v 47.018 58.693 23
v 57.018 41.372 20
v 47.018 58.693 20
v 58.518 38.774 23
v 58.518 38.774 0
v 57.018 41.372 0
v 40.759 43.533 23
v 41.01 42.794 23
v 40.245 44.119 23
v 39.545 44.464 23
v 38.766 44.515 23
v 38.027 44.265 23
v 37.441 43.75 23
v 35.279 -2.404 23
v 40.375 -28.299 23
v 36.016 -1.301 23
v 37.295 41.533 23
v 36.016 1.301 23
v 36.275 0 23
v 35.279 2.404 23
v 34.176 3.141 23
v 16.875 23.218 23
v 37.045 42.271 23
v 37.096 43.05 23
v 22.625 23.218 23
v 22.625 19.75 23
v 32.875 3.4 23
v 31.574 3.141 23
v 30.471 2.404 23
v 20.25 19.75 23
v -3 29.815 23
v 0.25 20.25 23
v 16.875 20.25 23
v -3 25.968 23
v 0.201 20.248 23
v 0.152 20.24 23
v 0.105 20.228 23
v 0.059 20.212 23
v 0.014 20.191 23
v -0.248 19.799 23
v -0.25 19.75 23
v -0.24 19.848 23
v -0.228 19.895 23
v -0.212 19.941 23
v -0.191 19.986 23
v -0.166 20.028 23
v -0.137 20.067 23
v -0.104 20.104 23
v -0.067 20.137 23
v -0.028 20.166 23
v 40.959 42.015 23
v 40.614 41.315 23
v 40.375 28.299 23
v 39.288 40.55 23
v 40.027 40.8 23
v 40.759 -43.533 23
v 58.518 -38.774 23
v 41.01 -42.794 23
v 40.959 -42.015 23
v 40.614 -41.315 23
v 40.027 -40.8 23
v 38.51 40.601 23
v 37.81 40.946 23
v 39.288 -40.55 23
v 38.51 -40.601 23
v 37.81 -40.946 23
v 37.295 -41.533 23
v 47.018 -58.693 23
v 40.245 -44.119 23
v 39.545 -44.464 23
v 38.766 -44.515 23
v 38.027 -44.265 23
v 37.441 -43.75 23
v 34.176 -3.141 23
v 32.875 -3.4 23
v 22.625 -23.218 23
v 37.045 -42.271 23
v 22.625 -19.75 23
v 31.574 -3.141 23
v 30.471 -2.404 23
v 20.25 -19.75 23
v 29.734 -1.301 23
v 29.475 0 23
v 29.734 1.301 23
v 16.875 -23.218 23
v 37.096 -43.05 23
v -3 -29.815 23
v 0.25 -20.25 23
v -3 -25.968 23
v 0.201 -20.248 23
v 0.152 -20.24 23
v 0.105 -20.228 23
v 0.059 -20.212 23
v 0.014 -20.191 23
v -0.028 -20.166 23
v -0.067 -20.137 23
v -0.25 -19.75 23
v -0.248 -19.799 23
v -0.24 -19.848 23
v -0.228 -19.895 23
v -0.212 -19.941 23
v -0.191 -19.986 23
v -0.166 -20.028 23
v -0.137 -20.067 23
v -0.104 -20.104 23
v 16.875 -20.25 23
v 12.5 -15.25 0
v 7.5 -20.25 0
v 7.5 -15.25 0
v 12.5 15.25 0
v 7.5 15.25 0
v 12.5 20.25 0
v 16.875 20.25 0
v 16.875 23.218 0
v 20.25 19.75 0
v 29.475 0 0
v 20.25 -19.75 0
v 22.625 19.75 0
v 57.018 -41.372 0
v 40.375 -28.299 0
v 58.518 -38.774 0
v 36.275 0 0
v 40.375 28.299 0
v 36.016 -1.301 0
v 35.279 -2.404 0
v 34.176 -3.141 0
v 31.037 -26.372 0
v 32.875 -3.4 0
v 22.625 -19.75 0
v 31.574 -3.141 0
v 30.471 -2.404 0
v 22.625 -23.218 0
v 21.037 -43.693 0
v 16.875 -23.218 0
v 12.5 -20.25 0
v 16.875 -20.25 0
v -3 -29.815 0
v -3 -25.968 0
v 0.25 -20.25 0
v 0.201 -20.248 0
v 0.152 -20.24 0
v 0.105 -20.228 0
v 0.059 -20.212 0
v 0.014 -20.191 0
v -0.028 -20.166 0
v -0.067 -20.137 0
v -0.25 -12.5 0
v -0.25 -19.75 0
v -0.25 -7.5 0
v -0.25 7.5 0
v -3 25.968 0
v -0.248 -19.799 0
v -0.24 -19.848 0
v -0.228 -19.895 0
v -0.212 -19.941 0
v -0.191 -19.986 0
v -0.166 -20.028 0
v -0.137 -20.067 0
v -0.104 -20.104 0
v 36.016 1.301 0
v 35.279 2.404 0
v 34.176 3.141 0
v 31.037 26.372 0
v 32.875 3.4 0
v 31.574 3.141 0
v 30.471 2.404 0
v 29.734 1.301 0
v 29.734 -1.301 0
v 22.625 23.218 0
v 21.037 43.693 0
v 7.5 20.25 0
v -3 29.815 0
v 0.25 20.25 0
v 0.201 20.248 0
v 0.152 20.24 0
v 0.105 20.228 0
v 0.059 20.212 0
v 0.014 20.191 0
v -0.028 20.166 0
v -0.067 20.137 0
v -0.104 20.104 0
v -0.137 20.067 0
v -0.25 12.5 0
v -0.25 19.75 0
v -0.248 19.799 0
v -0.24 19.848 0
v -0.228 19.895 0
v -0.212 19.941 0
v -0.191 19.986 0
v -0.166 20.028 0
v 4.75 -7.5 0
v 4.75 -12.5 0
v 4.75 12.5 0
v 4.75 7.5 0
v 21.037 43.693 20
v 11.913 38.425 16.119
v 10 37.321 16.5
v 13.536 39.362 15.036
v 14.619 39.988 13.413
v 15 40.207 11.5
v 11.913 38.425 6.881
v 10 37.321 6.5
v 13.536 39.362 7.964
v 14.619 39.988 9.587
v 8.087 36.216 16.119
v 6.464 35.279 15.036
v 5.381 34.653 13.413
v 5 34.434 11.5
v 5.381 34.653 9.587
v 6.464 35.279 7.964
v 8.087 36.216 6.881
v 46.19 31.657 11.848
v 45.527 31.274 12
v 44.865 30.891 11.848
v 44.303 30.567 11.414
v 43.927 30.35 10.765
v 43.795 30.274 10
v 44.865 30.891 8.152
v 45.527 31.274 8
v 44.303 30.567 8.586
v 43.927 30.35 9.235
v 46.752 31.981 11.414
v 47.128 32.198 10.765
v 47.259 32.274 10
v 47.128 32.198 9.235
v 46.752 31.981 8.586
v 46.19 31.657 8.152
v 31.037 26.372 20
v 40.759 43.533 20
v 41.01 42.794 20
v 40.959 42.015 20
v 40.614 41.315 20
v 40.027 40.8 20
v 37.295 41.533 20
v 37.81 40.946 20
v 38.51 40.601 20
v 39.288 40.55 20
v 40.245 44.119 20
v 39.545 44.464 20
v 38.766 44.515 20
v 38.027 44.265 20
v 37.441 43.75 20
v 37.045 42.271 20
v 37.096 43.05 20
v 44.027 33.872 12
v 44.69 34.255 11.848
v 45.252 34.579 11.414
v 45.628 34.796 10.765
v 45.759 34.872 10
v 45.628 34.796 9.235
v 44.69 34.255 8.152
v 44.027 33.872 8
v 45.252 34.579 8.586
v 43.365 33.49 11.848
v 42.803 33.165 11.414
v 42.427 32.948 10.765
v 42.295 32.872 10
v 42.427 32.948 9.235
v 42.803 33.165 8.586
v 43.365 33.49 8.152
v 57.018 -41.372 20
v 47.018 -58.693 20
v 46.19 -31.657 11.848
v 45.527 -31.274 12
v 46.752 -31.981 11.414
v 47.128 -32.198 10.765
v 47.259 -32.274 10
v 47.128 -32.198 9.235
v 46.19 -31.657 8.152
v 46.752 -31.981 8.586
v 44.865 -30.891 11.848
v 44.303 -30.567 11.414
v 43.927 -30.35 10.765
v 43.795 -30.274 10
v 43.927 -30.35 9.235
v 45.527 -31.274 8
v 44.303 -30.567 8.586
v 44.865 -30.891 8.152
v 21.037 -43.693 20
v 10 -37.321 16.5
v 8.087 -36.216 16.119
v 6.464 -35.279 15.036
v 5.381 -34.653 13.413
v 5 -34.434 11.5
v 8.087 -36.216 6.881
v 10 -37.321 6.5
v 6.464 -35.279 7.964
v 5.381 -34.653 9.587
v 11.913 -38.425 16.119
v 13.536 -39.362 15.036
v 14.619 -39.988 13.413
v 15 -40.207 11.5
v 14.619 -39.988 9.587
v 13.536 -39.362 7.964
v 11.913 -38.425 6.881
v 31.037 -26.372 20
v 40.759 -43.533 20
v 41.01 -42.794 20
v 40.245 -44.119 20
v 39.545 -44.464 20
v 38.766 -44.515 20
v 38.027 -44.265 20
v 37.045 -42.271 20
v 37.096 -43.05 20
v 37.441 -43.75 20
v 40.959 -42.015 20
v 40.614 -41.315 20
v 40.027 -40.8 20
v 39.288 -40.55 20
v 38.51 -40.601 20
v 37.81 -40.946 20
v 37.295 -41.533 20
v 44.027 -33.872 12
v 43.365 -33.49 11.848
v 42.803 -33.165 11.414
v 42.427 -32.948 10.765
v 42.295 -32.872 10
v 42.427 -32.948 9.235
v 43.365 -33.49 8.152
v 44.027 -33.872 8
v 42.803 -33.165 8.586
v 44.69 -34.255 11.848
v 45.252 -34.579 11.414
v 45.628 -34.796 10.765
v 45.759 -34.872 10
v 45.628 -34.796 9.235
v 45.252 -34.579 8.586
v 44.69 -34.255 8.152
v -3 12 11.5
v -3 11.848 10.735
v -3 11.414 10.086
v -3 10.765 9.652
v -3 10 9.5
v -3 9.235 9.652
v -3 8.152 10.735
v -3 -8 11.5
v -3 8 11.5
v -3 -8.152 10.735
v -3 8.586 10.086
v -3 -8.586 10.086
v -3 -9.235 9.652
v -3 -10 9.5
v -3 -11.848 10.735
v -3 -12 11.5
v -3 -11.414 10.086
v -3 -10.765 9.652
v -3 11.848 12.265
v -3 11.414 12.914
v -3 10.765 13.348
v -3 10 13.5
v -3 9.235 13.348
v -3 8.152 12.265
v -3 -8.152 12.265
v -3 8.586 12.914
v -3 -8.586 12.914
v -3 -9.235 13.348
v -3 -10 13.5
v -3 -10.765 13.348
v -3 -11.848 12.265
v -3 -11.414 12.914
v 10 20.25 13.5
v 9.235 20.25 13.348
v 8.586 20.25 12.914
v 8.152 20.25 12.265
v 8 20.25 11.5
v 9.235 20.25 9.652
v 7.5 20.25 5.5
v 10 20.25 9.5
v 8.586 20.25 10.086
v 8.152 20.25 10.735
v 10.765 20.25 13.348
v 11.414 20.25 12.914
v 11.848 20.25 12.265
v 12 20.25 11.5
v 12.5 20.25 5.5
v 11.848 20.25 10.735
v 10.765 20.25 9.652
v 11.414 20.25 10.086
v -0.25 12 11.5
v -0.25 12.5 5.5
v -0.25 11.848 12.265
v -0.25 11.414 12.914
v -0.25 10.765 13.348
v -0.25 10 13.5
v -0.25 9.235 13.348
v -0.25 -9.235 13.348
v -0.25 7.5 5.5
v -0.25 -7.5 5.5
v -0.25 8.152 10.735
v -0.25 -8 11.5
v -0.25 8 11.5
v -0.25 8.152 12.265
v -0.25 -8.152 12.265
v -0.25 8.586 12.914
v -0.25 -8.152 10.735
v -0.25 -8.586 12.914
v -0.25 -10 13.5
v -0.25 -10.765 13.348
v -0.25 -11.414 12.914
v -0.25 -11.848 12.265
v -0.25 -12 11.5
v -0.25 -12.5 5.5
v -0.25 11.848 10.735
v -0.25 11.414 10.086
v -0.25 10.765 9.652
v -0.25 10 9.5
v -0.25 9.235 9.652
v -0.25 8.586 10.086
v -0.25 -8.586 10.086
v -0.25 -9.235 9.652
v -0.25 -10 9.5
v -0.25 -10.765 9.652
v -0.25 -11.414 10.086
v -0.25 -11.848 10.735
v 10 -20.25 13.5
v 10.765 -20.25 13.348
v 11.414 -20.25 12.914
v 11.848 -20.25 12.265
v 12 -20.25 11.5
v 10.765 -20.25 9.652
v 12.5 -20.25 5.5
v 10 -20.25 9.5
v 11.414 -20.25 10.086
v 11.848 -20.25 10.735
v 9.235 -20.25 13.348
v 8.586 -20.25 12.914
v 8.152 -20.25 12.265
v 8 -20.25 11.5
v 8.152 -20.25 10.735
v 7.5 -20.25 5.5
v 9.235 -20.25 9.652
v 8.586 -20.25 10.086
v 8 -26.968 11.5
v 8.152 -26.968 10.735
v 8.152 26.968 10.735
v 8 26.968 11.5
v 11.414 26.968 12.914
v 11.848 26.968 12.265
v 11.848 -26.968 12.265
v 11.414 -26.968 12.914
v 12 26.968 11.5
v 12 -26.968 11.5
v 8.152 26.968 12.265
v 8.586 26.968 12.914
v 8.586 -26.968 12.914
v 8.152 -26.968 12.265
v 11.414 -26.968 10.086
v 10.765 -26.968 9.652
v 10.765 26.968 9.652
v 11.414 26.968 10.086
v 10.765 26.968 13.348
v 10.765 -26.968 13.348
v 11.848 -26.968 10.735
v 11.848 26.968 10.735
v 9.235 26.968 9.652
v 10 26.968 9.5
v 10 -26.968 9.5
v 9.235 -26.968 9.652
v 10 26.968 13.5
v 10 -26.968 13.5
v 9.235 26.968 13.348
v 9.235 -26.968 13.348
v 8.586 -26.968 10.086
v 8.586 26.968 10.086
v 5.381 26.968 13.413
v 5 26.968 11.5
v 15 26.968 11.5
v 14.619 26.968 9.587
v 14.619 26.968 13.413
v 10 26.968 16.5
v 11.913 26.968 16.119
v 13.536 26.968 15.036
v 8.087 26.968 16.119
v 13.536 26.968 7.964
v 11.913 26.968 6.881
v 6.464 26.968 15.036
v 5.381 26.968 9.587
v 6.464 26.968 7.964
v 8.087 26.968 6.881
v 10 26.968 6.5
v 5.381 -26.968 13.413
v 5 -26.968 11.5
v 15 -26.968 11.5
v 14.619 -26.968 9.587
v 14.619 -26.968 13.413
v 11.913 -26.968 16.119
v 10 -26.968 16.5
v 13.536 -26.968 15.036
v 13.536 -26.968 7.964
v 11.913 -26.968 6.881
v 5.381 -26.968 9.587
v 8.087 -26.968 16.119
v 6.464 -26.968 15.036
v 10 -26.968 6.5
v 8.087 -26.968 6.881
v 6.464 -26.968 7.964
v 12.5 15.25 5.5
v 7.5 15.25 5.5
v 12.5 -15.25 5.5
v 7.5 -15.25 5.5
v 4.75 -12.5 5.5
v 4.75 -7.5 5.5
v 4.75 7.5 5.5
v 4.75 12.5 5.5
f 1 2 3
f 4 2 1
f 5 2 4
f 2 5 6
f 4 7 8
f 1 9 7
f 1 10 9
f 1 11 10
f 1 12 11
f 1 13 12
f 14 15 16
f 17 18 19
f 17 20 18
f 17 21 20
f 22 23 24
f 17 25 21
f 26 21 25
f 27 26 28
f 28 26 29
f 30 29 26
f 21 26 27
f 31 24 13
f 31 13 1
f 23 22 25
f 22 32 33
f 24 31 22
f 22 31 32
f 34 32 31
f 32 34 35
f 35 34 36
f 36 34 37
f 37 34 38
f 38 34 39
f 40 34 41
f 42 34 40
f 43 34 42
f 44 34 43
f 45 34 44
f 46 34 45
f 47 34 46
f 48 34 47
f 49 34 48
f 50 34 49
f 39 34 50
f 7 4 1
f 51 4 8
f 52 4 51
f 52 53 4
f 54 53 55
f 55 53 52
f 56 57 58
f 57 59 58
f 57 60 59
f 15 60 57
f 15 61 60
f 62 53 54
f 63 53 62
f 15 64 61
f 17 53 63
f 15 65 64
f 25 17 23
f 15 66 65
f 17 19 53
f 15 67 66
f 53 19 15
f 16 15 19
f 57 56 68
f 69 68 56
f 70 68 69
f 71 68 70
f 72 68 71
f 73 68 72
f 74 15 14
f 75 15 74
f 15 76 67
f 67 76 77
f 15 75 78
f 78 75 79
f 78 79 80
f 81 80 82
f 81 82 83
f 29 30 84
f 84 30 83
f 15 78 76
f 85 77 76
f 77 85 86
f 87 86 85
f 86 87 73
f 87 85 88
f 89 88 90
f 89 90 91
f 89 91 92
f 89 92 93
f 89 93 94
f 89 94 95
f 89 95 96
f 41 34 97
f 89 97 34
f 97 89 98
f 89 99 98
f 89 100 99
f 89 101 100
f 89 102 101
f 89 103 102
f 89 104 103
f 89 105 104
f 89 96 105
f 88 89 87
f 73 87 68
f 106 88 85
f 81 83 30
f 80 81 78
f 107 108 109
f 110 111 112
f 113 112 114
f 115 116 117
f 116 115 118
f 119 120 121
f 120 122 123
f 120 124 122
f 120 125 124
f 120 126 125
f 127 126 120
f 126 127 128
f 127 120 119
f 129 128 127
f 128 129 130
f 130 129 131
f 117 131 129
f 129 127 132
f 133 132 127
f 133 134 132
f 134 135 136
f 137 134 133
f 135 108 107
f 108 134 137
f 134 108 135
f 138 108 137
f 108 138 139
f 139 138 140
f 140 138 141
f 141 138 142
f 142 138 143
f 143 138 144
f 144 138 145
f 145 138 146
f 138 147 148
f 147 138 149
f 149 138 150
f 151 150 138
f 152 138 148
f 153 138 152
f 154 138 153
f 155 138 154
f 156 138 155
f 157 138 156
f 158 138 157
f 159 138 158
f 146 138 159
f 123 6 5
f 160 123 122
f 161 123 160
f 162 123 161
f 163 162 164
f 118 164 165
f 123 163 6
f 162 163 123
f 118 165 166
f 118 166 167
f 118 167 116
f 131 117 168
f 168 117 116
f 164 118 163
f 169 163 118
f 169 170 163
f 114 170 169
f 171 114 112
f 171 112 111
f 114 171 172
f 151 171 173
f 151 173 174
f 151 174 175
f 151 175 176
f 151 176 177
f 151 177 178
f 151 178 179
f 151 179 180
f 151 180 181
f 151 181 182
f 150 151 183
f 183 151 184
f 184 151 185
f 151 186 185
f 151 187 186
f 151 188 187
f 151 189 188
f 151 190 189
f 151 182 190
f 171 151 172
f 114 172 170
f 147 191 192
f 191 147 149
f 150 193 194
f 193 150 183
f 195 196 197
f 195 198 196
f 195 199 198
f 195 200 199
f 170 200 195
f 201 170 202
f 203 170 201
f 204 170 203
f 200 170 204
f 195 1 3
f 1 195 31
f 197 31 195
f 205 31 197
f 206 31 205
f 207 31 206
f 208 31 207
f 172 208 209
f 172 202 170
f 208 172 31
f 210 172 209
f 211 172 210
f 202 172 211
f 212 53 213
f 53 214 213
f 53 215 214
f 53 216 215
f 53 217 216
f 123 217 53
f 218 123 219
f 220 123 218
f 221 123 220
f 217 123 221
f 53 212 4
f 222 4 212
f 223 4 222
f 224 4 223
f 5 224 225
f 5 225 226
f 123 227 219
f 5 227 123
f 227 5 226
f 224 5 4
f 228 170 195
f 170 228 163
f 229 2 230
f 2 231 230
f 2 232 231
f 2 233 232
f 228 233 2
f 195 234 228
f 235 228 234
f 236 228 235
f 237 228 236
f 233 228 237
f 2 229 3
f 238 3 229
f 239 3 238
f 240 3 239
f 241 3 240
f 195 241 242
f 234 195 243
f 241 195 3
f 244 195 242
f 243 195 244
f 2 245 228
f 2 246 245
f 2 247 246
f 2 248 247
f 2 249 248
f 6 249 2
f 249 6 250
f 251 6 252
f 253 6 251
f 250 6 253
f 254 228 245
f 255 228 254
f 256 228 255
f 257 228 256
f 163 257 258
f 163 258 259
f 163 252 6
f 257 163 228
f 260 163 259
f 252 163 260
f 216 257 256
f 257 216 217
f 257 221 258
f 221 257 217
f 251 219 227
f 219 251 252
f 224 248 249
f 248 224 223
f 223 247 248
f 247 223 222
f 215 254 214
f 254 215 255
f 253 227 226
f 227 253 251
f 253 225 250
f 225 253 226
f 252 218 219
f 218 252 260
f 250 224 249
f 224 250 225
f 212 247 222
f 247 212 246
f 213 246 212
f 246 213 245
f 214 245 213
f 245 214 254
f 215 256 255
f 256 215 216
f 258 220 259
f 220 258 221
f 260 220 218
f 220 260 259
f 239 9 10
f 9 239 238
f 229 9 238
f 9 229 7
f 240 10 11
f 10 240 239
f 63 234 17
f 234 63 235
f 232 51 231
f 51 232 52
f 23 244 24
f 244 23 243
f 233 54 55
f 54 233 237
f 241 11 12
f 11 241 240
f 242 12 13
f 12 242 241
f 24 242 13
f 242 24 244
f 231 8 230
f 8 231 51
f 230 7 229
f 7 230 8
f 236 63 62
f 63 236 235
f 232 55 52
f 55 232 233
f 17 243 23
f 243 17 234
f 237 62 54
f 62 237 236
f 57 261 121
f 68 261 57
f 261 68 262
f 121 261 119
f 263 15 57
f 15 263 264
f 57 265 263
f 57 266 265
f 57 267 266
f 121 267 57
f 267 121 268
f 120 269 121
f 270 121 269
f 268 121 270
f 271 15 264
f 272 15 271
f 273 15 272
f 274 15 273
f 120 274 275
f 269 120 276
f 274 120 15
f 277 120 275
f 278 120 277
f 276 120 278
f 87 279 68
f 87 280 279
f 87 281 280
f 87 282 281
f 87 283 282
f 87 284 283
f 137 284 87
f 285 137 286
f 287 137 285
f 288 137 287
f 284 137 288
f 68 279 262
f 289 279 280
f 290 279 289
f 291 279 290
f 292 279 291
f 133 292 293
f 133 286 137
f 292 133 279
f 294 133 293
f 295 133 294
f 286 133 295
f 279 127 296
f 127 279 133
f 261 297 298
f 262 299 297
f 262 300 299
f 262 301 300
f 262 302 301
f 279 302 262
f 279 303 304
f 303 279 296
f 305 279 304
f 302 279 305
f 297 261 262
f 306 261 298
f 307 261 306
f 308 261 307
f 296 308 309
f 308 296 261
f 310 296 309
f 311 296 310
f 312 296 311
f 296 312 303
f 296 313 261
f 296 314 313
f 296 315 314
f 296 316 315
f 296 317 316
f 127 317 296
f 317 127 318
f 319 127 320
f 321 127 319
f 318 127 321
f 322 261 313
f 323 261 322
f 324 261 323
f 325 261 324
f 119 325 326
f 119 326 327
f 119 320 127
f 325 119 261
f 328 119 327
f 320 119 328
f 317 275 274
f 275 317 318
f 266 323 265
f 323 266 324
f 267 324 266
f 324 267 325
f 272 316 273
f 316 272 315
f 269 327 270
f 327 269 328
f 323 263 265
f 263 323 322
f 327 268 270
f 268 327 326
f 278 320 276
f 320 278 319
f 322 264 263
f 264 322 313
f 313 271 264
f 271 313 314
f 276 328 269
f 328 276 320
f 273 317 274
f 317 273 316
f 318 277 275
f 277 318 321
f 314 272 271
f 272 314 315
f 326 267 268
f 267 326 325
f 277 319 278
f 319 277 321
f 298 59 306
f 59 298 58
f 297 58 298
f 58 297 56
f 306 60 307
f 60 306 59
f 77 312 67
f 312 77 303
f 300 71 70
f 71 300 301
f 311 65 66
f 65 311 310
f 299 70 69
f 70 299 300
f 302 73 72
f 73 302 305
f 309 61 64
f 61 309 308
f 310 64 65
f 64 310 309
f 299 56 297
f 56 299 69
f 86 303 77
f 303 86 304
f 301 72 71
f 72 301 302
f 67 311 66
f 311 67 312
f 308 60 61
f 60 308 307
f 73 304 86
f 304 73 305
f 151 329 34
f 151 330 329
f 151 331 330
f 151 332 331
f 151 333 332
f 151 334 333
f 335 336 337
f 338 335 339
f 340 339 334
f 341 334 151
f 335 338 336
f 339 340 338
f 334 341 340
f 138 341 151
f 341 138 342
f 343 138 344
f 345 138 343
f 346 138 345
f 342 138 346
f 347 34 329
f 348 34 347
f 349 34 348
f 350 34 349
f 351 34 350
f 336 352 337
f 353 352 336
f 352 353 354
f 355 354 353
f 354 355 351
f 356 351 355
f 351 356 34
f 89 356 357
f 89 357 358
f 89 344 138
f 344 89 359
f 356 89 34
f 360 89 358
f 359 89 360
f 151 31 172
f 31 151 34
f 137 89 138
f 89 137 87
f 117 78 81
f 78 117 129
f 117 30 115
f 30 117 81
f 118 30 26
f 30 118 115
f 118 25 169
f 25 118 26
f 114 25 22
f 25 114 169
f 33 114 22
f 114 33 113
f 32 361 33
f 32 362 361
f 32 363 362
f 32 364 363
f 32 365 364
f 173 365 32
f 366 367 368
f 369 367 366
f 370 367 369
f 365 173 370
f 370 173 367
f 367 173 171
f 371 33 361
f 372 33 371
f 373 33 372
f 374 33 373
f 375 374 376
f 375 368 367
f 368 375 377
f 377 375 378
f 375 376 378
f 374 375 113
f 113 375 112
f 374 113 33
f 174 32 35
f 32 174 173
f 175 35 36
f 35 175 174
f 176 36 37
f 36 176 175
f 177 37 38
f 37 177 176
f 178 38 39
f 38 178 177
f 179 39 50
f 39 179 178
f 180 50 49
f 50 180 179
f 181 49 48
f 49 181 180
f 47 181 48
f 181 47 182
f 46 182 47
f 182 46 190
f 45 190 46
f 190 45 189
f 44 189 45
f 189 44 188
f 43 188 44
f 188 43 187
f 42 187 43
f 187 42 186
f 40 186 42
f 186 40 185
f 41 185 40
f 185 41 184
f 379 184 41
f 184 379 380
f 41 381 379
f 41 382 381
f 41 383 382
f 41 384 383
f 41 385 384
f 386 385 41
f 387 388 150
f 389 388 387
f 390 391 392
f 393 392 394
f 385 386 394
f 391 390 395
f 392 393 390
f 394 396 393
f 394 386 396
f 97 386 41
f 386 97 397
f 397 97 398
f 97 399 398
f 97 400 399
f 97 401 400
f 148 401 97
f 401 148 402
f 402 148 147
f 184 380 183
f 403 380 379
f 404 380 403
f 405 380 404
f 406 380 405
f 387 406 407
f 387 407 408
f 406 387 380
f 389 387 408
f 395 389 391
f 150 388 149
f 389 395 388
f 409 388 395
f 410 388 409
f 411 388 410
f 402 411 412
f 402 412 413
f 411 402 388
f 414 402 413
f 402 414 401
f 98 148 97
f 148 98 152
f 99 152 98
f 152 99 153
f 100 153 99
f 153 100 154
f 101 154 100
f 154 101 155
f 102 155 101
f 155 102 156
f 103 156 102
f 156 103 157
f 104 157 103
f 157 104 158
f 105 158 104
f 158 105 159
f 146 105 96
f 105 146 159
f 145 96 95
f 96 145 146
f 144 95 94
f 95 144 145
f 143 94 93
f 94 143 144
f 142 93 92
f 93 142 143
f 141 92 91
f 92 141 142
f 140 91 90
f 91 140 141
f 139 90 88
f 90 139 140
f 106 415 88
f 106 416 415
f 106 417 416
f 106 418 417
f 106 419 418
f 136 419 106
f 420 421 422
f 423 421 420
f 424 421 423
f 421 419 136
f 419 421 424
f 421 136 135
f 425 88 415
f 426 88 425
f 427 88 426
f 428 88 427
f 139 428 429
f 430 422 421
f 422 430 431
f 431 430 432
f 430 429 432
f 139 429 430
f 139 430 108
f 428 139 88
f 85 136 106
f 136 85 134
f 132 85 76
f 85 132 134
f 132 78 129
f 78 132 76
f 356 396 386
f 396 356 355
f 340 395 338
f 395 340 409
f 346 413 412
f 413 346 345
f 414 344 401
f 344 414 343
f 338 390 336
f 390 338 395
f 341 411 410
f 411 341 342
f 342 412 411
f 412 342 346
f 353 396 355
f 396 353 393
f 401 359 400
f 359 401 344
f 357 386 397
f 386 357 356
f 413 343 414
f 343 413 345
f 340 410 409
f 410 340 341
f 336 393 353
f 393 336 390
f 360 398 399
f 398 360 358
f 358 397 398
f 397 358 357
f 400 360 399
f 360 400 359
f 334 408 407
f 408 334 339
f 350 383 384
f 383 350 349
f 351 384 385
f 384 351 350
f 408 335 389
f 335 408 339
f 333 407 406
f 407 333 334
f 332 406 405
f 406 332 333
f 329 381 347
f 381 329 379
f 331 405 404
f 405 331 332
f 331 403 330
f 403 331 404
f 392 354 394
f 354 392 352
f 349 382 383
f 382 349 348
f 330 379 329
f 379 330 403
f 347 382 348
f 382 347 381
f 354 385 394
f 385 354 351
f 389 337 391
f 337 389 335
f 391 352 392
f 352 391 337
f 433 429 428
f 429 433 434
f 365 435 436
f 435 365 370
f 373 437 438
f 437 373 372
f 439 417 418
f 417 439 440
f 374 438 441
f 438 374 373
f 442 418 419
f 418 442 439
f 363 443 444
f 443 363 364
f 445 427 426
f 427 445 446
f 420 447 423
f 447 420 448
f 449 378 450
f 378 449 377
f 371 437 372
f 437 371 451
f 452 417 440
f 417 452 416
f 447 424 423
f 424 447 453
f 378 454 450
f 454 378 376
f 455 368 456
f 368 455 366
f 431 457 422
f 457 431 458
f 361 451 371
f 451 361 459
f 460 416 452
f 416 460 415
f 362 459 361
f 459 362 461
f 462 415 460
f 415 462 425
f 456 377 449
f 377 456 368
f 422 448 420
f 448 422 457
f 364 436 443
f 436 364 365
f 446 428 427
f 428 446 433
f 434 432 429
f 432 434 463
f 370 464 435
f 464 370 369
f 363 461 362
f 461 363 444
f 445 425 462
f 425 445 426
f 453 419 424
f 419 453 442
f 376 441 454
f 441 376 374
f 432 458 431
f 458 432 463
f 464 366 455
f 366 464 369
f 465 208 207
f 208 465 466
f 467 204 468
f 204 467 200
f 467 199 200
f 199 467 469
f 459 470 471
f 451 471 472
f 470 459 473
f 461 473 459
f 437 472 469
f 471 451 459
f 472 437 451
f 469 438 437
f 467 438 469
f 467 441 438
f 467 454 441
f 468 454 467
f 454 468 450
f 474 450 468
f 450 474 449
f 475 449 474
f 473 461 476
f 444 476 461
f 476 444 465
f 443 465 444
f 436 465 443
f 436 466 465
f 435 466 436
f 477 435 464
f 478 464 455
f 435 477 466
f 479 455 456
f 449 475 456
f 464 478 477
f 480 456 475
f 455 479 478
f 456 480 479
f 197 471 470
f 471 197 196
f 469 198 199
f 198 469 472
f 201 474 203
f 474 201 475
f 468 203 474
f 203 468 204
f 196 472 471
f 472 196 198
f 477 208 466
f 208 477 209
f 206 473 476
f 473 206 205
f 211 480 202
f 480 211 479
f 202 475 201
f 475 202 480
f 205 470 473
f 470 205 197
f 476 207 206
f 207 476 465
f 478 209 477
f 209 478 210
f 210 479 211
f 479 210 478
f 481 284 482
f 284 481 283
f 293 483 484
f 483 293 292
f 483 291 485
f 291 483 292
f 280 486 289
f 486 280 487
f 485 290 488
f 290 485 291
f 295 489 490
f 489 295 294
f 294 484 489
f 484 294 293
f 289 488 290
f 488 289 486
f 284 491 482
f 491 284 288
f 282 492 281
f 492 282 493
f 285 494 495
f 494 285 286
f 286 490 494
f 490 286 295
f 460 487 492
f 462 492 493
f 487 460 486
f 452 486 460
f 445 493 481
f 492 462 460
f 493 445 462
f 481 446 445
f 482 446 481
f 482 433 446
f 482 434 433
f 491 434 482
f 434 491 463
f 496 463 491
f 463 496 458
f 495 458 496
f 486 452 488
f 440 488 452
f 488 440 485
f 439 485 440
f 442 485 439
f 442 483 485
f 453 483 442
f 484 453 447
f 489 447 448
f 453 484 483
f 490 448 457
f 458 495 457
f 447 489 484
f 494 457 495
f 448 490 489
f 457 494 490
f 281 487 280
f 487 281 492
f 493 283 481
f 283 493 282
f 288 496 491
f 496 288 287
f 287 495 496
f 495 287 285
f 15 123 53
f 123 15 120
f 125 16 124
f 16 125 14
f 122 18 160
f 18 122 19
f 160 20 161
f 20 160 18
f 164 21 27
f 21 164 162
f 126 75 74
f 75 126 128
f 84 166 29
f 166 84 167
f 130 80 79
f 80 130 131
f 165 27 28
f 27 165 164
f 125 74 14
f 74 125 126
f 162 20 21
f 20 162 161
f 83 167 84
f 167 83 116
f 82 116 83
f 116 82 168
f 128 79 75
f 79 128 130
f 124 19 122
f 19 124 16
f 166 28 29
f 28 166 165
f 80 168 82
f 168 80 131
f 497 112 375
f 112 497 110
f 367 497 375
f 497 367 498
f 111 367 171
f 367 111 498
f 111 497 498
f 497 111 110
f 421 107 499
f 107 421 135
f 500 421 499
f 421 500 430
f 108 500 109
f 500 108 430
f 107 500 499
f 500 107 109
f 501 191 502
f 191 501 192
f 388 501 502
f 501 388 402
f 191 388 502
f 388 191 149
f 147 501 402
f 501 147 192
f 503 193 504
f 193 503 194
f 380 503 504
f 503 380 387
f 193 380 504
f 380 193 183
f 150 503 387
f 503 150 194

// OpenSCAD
/**********************************************************************************************************************
 **
 ** parts/printed/foot_rail.scad
 **
 ** This file constructs the version of the foot of the printer frame that holds a horizontal rail. To assemble the 
 ** printer, you need three of these parts.
 **
 **********************************************************************************************************************/

include <../../conf/colors.scad>
include <../../conf/derived_sizes.scad>
include <../../conf/part_sizes.scad>

use <../../bom/bom.scad>
use <../../parts/extrusions/makerslide.scad>
use <../../parts/extrusions/vslot_2020.scad>
use <../../parts/vitamins/vitamins.scad>

// The dimensions of the horizontal parts that hold the V-Slot extrusions.
function _foot_rail_horizontal_height() = vslot_2020_depth() + frame_wall_thickness();
function _foot_rail_horizontal_width()  = vslot_2020_width() + frame_wall_thickness();
function _foot_rail_horizontal_depth()  = horizontal_extrusion_offset() + horizontal_recess_depth();
function _foot_rail_horizontal_left_y_offset() = -frame_wall_thickness() + horizontal_extrusion_outward_offset();
function _foot_rail_horizontal_right_y_offset() = -_foot_rail_horizontal_width() - horizontal_extrusion_outward_offset() + frame_wall_thickness();

// The dimensions of the vertical part that holds the MakerSlide extrusion.
function _foot_rail_vertical_height() = foot_rail_makerslide_recess_depth();
function _foot_rail_vertical_width()  = frame_wall_thickness() + makerslide_width() + frame_wall_thickness();
function _foot_rail_vertical_depth()  = frame_wall_thickness() + makerslide_depth() + frame_wall_thickness();
function _foot_rail_vertical_side_screw_height() = _foot_rail_horizontal_height()/2; // align with other screw
function _foot_rail_vertical_side_screw_y_offset() = _foot_rail_vertical_width()/2 + 1;

function _foot_rail_t_slot_nut_holder_height() = (foot_rail_makerslide_recess_depth() - t_slot_nut_length()) / 2 
                                                 - t_slot_nut_clearance();

/**
 * Auxiliary module that creates one of the vertical legs. Not to be used outside of this file.
 */
module _foot_rail_horizontal_leg(right = false) { 
	difference() {
		// the basic shape of the leg
		cube([_foot_rail_horizontal_depth(), _foot_rail_horizontal_width(), _foot_rail_horizontal_height()]);
		// minus the recess for the horizontal extrusion
		translate([horizontal_extrusion_offset(), right ? 0 : frame_wall_thickness(), vslot_2020_depth()])
			rotate([0, 90, 0])
				vslot_2020_punch(horizontal_recess_depth());
		// minus the screw hole on the inside
		_screw_x = _foot_rail_horizontal_depth() - horizontal_screw_distance();
		translate([_screw_x, _foot_rail_horizontal_width()/2, vslot_2020_depth()/2])
			rotate([90, 0, 0])
				cylinder(d = frame_screw_size(), h = _foot_rail_horizontal_width(), 
		                 center = true, $fn = frame_screw_hole_resolution());
		// minus the screw hole on the top side
		translate([_screw_x, vslot_2020_depth()/2 + (right ? 0 : frame_wall_thickness()), _foot_rail_horizontal_height() - frame_wall_thickness()])
				cylinder(d = frame_screw_size(), h = 2*frame_wall_thickness(), 
		                 center = true, $fn = frame_screw_hole_resolution());
	}
}

/**
 * Auxiliary module that creates the hardware for one of the vertical legs. Not to be used outside of this file.
 */
module _foot_rail_horizontal_leg_hardware(right = false, side_screws = true, top_screws = false) { 
	_screw_x = _foot_rail_horizontal_depth()-horizontal_screw_distance();
	
	if (side_screws) {
		// inner screw
		translate([_screw_x, 
			       right ? _foot_rail_horizontal_width() + epsilon() + washer_thickness(M4) 
		    	         : -epsilon() - washer_thickness(M4), 
			       vslot_2020_depth()/2])
			rotate([0, 0, right ? -90 : 90]) {
				washer(M4);
			}
		translate([_screw_x, 
			       right ? _foot_rail_horizontal_width() + epsilon() + washer_thickness(M4) + epsilon() 
		    	         : -epsilon() - washer_thickness(M4) - epsilon(), 
			       vslot_2020_depth()/2])
			rotate([0, 0, right ? -90 : 90]) {
				screw(size = M4, length = 8);
				nut_tslot(M4);
			}
	}

	if (top_screws) {
		// top screw
		translate([_screw_x, 
			       vslot_2020_depth()/2 + (right ? 0 : frame_wall_thickness()), 
			       _foot_rail_horizontal_height() + epsilon() + washer_thickness(M4) ])
			rotate([0, 90, 0]) {
				washer(size = M4);
			}
		translate([_screw_x, 
			       vslot_2020_depth()/2 + (right ? 0 : frame_wall_thickness()), 
			       _foot_rail_horizontal_height() + epsilon() + washer_thickness(M4) + epsilon()])
			rotate([0, 90, 0]) {
				screw(size = M4, length = 8);
				nut_tslot(M4);
			}
	}
}

/**
 * Creates the bottom plate that the foot screw will screw into
 */
module _foot_rail_bottom_plate() {
	_base_width = makerslide_width();	
	_edge_width = _base_width + 2 * (foot_rail_plate_depth() * tan(30));
	translate([_foot_rail_vertical_depth() - frame_wall_thickness(), 0, 0]) { 
		difference() {
			// the plate itself
			linear_extrude(height = foot_rail_plate_height(), center = false) {
				polygon(points = [
					[ 0, -_base_width/2],
					[ 0, _base_width/2],
					[ foot_rail_plate_depth(), _edge_width/2],
					[ foot_rail_plate_depth(), -_edge_width/2]
				]);
			}
			// minus the screw hole for the external foot
			translate([foot_rail_plate_depth()/2, 0, -epsilon()])
				cylinder(d = tap_base_diameter(foot_rail_bottom_screw_size()), 
					     h = foot_rail_plate_height() + 2 * epsilon(), 
					     $fn = frame_screw_hole_resolution());
	 	}
	}
}

/**
 * Creates the lower foot assembly by rendering it from scratch. This module is not to be called externally, use 
 * foot() instead.
 */
module _render_foot_rail() {
	color_printed_outer_frame()
		render() {
			difference() {
				union() {
					// add a block to hold the MakerSlide extrusion, but without the holes for now
					translate([-frame_wall_thickness(), -_foot_rail_vertical_width()/2, 0])
						cube([_foot_rail_vertical_depth(), _foot_rail_vertical_width(), _foot_rail_vertical_height()]);
					// add blocks to hold the V-Slot extrusions, restricted to the specified wall depth in negative Y
					difference() {
						union() {
							rotate([0, 0, 30])
								translate([0, _foot_rail_horizontal_left_y_offset(), 0])
									_foot_rail_horizontal_leg(right = false);
							rotate([0, 0, -30])
								translate([0, _foot_rail_horizontal_right_y_offset(), 0])
									_foot_rail_horizontal_leg(right = true);
						}
						translate([-vslot_2020_depth()-frame_wall_thickness(), -makerslide_width(), 0])
							cube([vslot_2020_depth(), 2*makerslide_width(), _foot_rail_horizontal_height()]);
					}
				}

				// minus the hole for the MakerSlide extrusion
				makerslide_punch(foot_rail_makerslide_recess_depth());

				// minus the screw holes on the back
				translate([-frame_wall_thickness()/2, -makerslide_slot_offset(), foot_rail_vertical_back_screw_height()])
					rotate([0, 90, 0])
						cylinder(d = frame_screw_size(), h = 2*frame_wall_thickness(), 
								 center = true, $fn = frame_screw_hole_resolution());
				translate([-frame_wall_thickness()/2, makerslide_slot_offset(), foot_rail_vertical_back_screw_height()])
					rotate([0, 90, 0])
						cylinder(d = frame_screw_size(), h = 2*frame_wall_thickness(), 
								 center = true, $fn = frame_screw_hole_resolution());

				// minus the screw holes on the side
				translate([makerslide_slot_offset(), 0, _foot_rail_vertical_side_screw_height()])
					rotate([90, 0, 0])
						cylinder(d = frame_screw_size(), h = 2*_foot_rail_vertical_width(), 
								 center = true, $fn = frame_screw_hole_resolution());

				// minus an additional inset so that the side screws can rest on a perpendicular surface
				_inset_depth = 100;
				translate([makerslide_slot_offset(), _foot_rail_vertical_side_screw_y_offset() + _inset_depth/2, _foot_rail_vertical_side_screw_height()])
					rotate([90, 0, 0])
						cylinder(d = frame_screw_head_size(), h = _inset_depth, 
								 center = true, $fn = frame_screw_hole_resolution());
				translate([makerslide_slot_offset(), -_foot_rail_vertical_side_screw_y_offset() - _inset_depth/2, _foot_rail_vertical_side_screw_height()])
					rotate([90, 0, 0])
						cylinder(d = frame_screw_head_size(), h = _inset_depth, 
								 center = true, $fn = frame_screw_hole_resolution());				
			}

			// plus the foot plate
			_foot_rail_bottom_plate();

			// plus the blocks to hold the T-Slot nut on the outer sides
			translate([(makerslide_base_depth() - t_slot_nut_holder_width()) / 2, 
				       makerslide_base_width() / 2 - t_slot_nut_holder_depth() + makerslide_clearance(), 
				       0])
				cube([t_slot_nut_holder_width(), t_slot_nut_holder_depth(), _foot_rail_t_slot_nut_holder_height()]);
			translate([(makerslide_base_depth() - t_slot_nut_holder_width()) / 2, 
				       -makerslide_base_width() / 2 - makerslide_clearance(), 
				       0])
				cube([t_slot_nut_holder_width(), t_slot_nut_holder_depth(), _foot_rail_t_slot_nut_holder_height()]);
	
			// plus the blocks to hold the T-Slot nut on the back sides
			translate([-makerslide_clearance(), 
				       -makerslide_slot_offset() - t_slot_nut_holder_width()/2, 
				       0])
				cube([t_slot_nut_holder_depth(), t_slot_nut_holder_width(), _foot_rail_t_slot_nut_holder_height()]);
			translate([-makerslide_clearance(), 
				       +makerslide_slot_offset() - t_slot_nut_holder_width()/2,
				       0])
				cube([t_slot_nut_holder_depth(), t_slot_nut_holder_width(), _foot_rail_t_slot_nut_holder_height()]);
	
		} 
}

/**
 * Main module to use the pre-rendered lower foot. The assembly is centered on the Z axis in Y direction for easier 
 * manipulation, similar to the MakerSlide extrusion. 
 */
module foot_rail() {
	bom_entry(section = "Printed Parts", description = "Frame", size = "Foot (Rail Version)");
	color_printed_outer_frame()
		import(file = "foot_rail.stl");
}

/** 
 * Renders the hardware (nuts, bolts, screws) that are used to fixed the printed part to the surrounding parts.
 */
module foot_rail_hardware(vertical_side_screws = true, vertical_back_screws = false, horizontal_side_screws = true, horizontal_top_screws = false) {

	// vertical MakerSlide rail -- back 
	if (vertical_back_screws) {
		translate([-frame_wall_thickness() - epsilon() - washer_thickness(M4), 
			       -makerslide_slot_offset(), 
			       foot_rail_vertical_back_screw_height()]) {
			washer(size = M4);
		}
		translate([-frame_wall_thickness() - epsilon() - washer_thickness(M4) - epsilon(), 
			       -makerslide_slot_offset(), 
			       foot_rail_vertical_back_screw_height()]) {
			screw(size = M4, length = 8);
			nut_tslot(M4);
		}
		translate([-frame_wall_thickness() - epsilon() - washer_thickness(M4),
		           makerslide_slot_offset(), 
		           foot_rail_vertical_back_screw_height()]) {
			washer(size = M4);
		}
		translate([-frame_wall_thickness() - epsilon() - washer_thickness(M4) - epsilon(),
		           makerslide_slot_offset(), 
		           foot_rail_vertical_back_screw_height()]) {
			screw(size = M4, length = 8);
			nut_tslot(M4);
		}
	}

	// vertical MakerSlide rail -- sides
	if (vertical_side_screws) {
		_side_screw_y = _foot_rail_vertical_side_screw_y_offset() + epsilon();
		translate([makerslide_slot_offset(), 
			       _side_screw_y + washer_thickness(M4), 
			       _foot_rail_vertical_side_screw_height()]) 
			rotate([0, 0, -90]) {
				washer(size = M4);
			}
		translate([makerslide_slot_offset(), 
			       _side_screw_y + washer_thickness(M4) + epsilon(), 
			       _foot_rail_vertical_side_screw_height()]) 
			rotate([0, 0, -90]) {
				screw(size = M4, length = 12);
				nut_tslot(M4);
			}
		translate([makerslide_slot_offset(), 
			       -_side_screw_y - washer_thickness(M4) - epsilon(), 
			       _foot_rail_vertical_side_screw_height()]) 
			rotate([0, 0, 90]) {
				screw(size = M4, length = 12);
				nut_tslot(M4);
			}
		translate([makerslide_slot_offset(), 
			       -_side_screw_y - washer_thickness(M4), 
			       _foot_rail_vertical_side_screw_height()]) 
			rotate([0, 0, 90]) {
				washer(size = M4);
			}
	}

	// left horizontal leg
	rotate([0, 0, 30])
		translate([0, _foot_rail_horizontal_left_y_offset(), 0])
			_foot_rail_horizontal_leg_hardware(right = false, 
				                               side_screw = horizontal_side_screws, 
				                               top_screw = horizontal_top_screws);


	// right horizontal leg
	rotate([0, 0, -30])
		translate([0, _foot_rail_horizontal_right_y_offset(), 0])
			_foot_rail_horizontal_leg_hardware(right = true, 
				                               side_screw = horizontal_side_screws, 
				                               top_screw = horizontal_top_screws);

}

_render_foot_rail();
